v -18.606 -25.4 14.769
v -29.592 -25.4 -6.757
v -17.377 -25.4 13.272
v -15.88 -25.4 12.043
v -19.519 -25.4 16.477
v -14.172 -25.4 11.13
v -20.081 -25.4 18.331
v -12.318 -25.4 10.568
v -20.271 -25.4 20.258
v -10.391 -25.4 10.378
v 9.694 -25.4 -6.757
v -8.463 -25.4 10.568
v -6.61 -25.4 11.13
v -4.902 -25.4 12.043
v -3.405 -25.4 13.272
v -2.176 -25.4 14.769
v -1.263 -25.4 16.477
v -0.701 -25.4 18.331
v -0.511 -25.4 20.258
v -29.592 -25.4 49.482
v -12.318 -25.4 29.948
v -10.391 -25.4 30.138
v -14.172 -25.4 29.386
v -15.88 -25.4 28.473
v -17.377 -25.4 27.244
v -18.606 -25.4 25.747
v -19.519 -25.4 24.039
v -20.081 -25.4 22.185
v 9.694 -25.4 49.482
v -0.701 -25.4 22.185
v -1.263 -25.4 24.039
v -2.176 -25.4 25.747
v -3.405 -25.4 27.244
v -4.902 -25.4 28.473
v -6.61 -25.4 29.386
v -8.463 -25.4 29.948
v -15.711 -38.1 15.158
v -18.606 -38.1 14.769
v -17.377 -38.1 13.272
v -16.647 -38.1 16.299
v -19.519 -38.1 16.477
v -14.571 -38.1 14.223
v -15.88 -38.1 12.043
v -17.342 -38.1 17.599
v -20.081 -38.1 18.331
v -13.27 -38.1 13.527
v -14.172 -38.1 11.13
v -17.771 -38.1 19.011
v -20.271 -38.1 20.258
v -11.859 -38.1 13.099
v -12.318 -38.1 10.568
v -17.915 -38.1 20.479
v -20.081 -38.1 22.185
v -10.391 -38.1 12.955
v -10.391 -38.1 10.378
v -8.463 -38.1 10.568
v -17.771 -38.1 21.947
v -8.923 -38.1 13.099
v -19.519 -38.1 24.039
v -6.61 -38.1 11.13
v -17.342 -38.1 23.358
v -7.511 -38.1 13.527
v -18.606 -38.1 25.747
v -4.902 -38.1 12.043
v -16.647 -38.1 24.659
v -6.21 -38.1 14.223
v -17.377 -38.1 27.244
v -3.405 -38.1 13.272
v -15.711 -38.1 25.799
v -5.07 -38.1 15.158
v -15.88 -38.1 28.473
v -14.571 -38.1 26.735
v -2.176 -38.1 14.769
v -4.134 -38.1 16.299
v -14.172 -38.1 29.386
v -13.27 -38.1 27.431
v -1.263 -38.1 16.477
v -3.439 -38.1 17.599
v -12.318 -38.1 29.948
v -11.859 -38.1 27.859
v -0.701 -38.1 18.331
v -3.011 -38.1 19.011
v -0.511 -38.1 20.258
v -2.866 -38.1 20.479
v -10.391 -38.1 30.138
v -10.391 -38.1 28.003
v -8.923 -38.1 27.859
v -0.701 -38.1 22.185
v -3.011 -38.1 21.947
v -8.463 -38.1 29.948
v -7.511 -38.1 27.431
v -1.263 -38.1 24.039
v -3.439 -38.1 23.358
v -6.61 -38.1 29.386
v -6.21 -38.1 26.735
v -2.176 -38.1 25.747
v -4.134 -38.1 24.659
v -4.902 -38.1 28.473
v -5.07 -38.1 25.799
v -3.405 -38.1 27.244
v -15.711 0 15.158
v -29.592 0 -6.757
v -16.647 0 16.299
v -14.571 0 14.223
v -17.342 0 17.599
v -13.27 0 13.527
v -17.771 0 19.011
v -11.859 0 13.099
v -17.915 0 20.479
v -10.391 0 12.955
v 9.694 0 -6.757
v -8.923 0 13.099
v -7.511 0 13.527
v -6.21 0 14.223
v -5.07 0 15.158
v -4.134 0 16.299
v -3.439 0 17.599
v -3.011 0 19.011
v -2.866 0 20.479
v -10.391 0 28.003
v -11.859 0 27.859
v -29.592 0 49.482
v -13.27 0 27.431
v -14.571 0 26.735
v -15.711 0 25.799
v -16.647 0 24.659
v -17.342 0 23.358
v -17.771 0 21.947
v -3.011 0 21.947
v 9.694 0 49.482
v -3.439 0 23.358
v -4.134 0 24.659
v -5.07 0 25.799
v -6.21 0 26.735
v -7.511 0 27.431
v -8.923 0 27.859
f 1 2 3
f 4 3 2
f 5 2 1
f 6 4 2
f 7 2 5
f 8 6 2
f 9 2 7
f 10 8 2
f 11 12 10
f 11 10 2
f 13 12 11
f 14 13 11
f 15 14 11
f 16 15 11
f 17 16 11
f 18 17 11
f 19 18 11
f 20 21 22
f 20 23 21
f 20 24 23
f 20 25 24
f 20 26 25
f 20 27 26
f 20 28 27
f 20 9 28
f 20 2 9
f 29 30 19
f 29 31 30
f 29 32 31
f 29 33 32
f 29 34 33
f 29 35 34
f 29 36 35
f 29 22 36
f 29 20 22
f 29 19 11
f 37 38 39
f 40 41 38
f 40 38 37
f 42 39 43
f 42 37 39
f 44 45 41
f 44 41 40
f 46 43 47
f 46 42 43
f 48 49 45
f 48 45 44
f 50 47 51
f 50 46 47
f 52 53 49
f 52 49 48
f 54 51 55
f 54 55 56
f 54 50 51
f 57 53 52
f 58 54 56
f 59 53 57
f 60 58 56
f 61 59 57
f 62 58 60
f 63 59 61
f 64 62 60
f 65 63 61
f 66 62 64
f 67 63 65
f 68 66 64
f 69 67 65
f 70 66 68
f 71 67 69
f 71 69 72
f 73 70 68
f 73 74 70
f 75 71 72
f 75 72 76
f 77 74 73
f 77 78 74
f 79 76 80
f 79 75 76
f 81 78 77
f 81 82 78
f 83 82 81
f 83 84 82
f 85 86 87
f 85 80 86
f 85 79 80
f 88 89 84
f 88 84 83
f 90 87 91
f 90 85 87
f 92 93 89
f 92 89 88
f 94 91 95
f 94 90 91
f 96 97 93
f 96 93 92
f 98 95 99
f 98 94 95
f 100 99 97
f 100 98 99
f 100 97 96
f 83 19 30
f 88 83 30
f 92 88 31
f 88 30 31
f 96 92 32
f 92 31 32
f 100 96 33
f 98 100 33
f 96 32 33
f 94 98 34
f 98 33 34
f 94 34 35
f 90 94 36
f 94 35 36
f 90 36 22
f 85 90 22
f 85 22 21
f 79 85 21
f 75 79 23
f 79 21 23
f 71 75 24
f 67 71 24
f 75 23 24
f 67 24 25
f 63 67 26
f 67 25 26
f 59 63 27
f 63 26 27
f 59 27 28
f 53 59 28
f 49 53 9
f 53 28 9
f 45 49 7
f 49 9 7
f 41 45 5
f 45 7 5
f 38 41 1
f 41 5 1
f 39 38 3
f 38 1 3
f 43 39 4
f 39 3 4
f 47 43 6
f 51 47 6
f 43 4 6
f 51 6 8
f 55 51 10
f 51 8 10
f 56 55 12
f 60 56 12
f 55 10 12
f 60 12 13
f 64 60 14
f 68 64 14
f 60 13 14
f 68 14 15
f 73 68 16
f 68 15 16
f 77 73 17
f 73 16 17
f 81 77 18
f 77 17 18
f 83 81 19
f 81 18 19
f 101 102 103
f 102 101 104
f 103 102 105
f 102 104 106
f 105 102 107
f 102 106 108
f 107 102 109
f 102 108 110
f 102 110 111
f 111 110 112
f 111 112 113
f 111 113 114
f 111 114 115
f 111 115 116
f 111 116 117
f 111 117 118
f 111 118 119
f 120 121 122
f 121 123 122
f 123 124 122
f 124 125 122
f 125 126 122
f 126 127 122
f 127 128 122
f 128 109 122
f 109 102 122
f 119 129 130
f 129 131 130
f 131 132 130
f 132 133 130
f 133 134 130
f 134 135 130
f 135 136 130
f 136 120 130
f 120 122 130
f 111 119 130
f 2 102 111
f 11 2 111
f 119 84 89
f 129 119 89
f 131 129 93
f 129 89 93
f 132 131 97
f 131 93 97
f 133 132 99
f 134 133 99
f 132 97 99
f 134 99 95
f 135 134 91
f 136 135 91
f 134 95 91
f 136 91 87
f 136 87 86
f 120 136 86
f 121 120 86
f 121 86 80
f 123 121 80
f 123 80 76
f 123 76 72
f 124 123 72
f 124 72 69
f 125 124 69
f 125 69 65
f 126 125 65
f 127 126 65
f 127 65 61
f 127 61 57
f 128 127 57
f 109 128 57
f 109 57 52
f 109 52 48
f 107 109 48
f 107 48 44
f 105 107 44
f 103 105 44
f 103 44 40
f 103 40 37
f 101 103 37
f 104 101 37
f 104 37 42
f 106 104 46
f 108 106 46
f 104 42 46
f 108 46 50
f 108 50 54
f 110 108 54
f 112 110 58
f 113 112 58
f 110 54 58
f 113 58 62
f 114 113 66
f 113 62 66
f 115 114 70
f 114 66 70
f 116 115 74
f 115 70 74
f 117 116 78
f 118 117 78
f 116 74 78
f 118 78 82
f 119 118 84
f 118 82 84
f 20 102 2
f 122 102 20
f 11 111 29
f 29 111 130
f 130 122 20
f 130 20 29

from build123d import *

# Parameters (mm, degrees)
F0_W     = 39.285619
F0_H     = 56.238633
F1_DEPTH = 25.4
F2_R     = 9.880036
F3_DEPTH = 12.7
F5_R     = 7.52441
F6_DEPTH = 38.101


with BuildPart() as f1:
    # F0 (on Front) → F1 (new body)
    with BuildSketch(Plane.XZ):
        with Locations((-9.948956, 21.362619)):
            Rectangle(F0_W, F0_H)
    extrude(amount=F1_DEPTH)

    # F2 (on face) → F3 (join)
    with BuildSketch(Plane.XZ.offset(25.4)):
        with Locations((-10.390805, 20.258)):
            Circle(F2_R)
    extrude(amount=F3_DEPTH)

    # F5 (on face) → F6 (cut, through all)
    with BuildSketch(Plane.XZ.offset(38.1)):
        with Locations((-10.390805, 20.478925)):
            Circle(F5_R)
    extrude(amount=-F6_DEPTH, mode=Mode.SUBTRACT)


solid = f1.part
